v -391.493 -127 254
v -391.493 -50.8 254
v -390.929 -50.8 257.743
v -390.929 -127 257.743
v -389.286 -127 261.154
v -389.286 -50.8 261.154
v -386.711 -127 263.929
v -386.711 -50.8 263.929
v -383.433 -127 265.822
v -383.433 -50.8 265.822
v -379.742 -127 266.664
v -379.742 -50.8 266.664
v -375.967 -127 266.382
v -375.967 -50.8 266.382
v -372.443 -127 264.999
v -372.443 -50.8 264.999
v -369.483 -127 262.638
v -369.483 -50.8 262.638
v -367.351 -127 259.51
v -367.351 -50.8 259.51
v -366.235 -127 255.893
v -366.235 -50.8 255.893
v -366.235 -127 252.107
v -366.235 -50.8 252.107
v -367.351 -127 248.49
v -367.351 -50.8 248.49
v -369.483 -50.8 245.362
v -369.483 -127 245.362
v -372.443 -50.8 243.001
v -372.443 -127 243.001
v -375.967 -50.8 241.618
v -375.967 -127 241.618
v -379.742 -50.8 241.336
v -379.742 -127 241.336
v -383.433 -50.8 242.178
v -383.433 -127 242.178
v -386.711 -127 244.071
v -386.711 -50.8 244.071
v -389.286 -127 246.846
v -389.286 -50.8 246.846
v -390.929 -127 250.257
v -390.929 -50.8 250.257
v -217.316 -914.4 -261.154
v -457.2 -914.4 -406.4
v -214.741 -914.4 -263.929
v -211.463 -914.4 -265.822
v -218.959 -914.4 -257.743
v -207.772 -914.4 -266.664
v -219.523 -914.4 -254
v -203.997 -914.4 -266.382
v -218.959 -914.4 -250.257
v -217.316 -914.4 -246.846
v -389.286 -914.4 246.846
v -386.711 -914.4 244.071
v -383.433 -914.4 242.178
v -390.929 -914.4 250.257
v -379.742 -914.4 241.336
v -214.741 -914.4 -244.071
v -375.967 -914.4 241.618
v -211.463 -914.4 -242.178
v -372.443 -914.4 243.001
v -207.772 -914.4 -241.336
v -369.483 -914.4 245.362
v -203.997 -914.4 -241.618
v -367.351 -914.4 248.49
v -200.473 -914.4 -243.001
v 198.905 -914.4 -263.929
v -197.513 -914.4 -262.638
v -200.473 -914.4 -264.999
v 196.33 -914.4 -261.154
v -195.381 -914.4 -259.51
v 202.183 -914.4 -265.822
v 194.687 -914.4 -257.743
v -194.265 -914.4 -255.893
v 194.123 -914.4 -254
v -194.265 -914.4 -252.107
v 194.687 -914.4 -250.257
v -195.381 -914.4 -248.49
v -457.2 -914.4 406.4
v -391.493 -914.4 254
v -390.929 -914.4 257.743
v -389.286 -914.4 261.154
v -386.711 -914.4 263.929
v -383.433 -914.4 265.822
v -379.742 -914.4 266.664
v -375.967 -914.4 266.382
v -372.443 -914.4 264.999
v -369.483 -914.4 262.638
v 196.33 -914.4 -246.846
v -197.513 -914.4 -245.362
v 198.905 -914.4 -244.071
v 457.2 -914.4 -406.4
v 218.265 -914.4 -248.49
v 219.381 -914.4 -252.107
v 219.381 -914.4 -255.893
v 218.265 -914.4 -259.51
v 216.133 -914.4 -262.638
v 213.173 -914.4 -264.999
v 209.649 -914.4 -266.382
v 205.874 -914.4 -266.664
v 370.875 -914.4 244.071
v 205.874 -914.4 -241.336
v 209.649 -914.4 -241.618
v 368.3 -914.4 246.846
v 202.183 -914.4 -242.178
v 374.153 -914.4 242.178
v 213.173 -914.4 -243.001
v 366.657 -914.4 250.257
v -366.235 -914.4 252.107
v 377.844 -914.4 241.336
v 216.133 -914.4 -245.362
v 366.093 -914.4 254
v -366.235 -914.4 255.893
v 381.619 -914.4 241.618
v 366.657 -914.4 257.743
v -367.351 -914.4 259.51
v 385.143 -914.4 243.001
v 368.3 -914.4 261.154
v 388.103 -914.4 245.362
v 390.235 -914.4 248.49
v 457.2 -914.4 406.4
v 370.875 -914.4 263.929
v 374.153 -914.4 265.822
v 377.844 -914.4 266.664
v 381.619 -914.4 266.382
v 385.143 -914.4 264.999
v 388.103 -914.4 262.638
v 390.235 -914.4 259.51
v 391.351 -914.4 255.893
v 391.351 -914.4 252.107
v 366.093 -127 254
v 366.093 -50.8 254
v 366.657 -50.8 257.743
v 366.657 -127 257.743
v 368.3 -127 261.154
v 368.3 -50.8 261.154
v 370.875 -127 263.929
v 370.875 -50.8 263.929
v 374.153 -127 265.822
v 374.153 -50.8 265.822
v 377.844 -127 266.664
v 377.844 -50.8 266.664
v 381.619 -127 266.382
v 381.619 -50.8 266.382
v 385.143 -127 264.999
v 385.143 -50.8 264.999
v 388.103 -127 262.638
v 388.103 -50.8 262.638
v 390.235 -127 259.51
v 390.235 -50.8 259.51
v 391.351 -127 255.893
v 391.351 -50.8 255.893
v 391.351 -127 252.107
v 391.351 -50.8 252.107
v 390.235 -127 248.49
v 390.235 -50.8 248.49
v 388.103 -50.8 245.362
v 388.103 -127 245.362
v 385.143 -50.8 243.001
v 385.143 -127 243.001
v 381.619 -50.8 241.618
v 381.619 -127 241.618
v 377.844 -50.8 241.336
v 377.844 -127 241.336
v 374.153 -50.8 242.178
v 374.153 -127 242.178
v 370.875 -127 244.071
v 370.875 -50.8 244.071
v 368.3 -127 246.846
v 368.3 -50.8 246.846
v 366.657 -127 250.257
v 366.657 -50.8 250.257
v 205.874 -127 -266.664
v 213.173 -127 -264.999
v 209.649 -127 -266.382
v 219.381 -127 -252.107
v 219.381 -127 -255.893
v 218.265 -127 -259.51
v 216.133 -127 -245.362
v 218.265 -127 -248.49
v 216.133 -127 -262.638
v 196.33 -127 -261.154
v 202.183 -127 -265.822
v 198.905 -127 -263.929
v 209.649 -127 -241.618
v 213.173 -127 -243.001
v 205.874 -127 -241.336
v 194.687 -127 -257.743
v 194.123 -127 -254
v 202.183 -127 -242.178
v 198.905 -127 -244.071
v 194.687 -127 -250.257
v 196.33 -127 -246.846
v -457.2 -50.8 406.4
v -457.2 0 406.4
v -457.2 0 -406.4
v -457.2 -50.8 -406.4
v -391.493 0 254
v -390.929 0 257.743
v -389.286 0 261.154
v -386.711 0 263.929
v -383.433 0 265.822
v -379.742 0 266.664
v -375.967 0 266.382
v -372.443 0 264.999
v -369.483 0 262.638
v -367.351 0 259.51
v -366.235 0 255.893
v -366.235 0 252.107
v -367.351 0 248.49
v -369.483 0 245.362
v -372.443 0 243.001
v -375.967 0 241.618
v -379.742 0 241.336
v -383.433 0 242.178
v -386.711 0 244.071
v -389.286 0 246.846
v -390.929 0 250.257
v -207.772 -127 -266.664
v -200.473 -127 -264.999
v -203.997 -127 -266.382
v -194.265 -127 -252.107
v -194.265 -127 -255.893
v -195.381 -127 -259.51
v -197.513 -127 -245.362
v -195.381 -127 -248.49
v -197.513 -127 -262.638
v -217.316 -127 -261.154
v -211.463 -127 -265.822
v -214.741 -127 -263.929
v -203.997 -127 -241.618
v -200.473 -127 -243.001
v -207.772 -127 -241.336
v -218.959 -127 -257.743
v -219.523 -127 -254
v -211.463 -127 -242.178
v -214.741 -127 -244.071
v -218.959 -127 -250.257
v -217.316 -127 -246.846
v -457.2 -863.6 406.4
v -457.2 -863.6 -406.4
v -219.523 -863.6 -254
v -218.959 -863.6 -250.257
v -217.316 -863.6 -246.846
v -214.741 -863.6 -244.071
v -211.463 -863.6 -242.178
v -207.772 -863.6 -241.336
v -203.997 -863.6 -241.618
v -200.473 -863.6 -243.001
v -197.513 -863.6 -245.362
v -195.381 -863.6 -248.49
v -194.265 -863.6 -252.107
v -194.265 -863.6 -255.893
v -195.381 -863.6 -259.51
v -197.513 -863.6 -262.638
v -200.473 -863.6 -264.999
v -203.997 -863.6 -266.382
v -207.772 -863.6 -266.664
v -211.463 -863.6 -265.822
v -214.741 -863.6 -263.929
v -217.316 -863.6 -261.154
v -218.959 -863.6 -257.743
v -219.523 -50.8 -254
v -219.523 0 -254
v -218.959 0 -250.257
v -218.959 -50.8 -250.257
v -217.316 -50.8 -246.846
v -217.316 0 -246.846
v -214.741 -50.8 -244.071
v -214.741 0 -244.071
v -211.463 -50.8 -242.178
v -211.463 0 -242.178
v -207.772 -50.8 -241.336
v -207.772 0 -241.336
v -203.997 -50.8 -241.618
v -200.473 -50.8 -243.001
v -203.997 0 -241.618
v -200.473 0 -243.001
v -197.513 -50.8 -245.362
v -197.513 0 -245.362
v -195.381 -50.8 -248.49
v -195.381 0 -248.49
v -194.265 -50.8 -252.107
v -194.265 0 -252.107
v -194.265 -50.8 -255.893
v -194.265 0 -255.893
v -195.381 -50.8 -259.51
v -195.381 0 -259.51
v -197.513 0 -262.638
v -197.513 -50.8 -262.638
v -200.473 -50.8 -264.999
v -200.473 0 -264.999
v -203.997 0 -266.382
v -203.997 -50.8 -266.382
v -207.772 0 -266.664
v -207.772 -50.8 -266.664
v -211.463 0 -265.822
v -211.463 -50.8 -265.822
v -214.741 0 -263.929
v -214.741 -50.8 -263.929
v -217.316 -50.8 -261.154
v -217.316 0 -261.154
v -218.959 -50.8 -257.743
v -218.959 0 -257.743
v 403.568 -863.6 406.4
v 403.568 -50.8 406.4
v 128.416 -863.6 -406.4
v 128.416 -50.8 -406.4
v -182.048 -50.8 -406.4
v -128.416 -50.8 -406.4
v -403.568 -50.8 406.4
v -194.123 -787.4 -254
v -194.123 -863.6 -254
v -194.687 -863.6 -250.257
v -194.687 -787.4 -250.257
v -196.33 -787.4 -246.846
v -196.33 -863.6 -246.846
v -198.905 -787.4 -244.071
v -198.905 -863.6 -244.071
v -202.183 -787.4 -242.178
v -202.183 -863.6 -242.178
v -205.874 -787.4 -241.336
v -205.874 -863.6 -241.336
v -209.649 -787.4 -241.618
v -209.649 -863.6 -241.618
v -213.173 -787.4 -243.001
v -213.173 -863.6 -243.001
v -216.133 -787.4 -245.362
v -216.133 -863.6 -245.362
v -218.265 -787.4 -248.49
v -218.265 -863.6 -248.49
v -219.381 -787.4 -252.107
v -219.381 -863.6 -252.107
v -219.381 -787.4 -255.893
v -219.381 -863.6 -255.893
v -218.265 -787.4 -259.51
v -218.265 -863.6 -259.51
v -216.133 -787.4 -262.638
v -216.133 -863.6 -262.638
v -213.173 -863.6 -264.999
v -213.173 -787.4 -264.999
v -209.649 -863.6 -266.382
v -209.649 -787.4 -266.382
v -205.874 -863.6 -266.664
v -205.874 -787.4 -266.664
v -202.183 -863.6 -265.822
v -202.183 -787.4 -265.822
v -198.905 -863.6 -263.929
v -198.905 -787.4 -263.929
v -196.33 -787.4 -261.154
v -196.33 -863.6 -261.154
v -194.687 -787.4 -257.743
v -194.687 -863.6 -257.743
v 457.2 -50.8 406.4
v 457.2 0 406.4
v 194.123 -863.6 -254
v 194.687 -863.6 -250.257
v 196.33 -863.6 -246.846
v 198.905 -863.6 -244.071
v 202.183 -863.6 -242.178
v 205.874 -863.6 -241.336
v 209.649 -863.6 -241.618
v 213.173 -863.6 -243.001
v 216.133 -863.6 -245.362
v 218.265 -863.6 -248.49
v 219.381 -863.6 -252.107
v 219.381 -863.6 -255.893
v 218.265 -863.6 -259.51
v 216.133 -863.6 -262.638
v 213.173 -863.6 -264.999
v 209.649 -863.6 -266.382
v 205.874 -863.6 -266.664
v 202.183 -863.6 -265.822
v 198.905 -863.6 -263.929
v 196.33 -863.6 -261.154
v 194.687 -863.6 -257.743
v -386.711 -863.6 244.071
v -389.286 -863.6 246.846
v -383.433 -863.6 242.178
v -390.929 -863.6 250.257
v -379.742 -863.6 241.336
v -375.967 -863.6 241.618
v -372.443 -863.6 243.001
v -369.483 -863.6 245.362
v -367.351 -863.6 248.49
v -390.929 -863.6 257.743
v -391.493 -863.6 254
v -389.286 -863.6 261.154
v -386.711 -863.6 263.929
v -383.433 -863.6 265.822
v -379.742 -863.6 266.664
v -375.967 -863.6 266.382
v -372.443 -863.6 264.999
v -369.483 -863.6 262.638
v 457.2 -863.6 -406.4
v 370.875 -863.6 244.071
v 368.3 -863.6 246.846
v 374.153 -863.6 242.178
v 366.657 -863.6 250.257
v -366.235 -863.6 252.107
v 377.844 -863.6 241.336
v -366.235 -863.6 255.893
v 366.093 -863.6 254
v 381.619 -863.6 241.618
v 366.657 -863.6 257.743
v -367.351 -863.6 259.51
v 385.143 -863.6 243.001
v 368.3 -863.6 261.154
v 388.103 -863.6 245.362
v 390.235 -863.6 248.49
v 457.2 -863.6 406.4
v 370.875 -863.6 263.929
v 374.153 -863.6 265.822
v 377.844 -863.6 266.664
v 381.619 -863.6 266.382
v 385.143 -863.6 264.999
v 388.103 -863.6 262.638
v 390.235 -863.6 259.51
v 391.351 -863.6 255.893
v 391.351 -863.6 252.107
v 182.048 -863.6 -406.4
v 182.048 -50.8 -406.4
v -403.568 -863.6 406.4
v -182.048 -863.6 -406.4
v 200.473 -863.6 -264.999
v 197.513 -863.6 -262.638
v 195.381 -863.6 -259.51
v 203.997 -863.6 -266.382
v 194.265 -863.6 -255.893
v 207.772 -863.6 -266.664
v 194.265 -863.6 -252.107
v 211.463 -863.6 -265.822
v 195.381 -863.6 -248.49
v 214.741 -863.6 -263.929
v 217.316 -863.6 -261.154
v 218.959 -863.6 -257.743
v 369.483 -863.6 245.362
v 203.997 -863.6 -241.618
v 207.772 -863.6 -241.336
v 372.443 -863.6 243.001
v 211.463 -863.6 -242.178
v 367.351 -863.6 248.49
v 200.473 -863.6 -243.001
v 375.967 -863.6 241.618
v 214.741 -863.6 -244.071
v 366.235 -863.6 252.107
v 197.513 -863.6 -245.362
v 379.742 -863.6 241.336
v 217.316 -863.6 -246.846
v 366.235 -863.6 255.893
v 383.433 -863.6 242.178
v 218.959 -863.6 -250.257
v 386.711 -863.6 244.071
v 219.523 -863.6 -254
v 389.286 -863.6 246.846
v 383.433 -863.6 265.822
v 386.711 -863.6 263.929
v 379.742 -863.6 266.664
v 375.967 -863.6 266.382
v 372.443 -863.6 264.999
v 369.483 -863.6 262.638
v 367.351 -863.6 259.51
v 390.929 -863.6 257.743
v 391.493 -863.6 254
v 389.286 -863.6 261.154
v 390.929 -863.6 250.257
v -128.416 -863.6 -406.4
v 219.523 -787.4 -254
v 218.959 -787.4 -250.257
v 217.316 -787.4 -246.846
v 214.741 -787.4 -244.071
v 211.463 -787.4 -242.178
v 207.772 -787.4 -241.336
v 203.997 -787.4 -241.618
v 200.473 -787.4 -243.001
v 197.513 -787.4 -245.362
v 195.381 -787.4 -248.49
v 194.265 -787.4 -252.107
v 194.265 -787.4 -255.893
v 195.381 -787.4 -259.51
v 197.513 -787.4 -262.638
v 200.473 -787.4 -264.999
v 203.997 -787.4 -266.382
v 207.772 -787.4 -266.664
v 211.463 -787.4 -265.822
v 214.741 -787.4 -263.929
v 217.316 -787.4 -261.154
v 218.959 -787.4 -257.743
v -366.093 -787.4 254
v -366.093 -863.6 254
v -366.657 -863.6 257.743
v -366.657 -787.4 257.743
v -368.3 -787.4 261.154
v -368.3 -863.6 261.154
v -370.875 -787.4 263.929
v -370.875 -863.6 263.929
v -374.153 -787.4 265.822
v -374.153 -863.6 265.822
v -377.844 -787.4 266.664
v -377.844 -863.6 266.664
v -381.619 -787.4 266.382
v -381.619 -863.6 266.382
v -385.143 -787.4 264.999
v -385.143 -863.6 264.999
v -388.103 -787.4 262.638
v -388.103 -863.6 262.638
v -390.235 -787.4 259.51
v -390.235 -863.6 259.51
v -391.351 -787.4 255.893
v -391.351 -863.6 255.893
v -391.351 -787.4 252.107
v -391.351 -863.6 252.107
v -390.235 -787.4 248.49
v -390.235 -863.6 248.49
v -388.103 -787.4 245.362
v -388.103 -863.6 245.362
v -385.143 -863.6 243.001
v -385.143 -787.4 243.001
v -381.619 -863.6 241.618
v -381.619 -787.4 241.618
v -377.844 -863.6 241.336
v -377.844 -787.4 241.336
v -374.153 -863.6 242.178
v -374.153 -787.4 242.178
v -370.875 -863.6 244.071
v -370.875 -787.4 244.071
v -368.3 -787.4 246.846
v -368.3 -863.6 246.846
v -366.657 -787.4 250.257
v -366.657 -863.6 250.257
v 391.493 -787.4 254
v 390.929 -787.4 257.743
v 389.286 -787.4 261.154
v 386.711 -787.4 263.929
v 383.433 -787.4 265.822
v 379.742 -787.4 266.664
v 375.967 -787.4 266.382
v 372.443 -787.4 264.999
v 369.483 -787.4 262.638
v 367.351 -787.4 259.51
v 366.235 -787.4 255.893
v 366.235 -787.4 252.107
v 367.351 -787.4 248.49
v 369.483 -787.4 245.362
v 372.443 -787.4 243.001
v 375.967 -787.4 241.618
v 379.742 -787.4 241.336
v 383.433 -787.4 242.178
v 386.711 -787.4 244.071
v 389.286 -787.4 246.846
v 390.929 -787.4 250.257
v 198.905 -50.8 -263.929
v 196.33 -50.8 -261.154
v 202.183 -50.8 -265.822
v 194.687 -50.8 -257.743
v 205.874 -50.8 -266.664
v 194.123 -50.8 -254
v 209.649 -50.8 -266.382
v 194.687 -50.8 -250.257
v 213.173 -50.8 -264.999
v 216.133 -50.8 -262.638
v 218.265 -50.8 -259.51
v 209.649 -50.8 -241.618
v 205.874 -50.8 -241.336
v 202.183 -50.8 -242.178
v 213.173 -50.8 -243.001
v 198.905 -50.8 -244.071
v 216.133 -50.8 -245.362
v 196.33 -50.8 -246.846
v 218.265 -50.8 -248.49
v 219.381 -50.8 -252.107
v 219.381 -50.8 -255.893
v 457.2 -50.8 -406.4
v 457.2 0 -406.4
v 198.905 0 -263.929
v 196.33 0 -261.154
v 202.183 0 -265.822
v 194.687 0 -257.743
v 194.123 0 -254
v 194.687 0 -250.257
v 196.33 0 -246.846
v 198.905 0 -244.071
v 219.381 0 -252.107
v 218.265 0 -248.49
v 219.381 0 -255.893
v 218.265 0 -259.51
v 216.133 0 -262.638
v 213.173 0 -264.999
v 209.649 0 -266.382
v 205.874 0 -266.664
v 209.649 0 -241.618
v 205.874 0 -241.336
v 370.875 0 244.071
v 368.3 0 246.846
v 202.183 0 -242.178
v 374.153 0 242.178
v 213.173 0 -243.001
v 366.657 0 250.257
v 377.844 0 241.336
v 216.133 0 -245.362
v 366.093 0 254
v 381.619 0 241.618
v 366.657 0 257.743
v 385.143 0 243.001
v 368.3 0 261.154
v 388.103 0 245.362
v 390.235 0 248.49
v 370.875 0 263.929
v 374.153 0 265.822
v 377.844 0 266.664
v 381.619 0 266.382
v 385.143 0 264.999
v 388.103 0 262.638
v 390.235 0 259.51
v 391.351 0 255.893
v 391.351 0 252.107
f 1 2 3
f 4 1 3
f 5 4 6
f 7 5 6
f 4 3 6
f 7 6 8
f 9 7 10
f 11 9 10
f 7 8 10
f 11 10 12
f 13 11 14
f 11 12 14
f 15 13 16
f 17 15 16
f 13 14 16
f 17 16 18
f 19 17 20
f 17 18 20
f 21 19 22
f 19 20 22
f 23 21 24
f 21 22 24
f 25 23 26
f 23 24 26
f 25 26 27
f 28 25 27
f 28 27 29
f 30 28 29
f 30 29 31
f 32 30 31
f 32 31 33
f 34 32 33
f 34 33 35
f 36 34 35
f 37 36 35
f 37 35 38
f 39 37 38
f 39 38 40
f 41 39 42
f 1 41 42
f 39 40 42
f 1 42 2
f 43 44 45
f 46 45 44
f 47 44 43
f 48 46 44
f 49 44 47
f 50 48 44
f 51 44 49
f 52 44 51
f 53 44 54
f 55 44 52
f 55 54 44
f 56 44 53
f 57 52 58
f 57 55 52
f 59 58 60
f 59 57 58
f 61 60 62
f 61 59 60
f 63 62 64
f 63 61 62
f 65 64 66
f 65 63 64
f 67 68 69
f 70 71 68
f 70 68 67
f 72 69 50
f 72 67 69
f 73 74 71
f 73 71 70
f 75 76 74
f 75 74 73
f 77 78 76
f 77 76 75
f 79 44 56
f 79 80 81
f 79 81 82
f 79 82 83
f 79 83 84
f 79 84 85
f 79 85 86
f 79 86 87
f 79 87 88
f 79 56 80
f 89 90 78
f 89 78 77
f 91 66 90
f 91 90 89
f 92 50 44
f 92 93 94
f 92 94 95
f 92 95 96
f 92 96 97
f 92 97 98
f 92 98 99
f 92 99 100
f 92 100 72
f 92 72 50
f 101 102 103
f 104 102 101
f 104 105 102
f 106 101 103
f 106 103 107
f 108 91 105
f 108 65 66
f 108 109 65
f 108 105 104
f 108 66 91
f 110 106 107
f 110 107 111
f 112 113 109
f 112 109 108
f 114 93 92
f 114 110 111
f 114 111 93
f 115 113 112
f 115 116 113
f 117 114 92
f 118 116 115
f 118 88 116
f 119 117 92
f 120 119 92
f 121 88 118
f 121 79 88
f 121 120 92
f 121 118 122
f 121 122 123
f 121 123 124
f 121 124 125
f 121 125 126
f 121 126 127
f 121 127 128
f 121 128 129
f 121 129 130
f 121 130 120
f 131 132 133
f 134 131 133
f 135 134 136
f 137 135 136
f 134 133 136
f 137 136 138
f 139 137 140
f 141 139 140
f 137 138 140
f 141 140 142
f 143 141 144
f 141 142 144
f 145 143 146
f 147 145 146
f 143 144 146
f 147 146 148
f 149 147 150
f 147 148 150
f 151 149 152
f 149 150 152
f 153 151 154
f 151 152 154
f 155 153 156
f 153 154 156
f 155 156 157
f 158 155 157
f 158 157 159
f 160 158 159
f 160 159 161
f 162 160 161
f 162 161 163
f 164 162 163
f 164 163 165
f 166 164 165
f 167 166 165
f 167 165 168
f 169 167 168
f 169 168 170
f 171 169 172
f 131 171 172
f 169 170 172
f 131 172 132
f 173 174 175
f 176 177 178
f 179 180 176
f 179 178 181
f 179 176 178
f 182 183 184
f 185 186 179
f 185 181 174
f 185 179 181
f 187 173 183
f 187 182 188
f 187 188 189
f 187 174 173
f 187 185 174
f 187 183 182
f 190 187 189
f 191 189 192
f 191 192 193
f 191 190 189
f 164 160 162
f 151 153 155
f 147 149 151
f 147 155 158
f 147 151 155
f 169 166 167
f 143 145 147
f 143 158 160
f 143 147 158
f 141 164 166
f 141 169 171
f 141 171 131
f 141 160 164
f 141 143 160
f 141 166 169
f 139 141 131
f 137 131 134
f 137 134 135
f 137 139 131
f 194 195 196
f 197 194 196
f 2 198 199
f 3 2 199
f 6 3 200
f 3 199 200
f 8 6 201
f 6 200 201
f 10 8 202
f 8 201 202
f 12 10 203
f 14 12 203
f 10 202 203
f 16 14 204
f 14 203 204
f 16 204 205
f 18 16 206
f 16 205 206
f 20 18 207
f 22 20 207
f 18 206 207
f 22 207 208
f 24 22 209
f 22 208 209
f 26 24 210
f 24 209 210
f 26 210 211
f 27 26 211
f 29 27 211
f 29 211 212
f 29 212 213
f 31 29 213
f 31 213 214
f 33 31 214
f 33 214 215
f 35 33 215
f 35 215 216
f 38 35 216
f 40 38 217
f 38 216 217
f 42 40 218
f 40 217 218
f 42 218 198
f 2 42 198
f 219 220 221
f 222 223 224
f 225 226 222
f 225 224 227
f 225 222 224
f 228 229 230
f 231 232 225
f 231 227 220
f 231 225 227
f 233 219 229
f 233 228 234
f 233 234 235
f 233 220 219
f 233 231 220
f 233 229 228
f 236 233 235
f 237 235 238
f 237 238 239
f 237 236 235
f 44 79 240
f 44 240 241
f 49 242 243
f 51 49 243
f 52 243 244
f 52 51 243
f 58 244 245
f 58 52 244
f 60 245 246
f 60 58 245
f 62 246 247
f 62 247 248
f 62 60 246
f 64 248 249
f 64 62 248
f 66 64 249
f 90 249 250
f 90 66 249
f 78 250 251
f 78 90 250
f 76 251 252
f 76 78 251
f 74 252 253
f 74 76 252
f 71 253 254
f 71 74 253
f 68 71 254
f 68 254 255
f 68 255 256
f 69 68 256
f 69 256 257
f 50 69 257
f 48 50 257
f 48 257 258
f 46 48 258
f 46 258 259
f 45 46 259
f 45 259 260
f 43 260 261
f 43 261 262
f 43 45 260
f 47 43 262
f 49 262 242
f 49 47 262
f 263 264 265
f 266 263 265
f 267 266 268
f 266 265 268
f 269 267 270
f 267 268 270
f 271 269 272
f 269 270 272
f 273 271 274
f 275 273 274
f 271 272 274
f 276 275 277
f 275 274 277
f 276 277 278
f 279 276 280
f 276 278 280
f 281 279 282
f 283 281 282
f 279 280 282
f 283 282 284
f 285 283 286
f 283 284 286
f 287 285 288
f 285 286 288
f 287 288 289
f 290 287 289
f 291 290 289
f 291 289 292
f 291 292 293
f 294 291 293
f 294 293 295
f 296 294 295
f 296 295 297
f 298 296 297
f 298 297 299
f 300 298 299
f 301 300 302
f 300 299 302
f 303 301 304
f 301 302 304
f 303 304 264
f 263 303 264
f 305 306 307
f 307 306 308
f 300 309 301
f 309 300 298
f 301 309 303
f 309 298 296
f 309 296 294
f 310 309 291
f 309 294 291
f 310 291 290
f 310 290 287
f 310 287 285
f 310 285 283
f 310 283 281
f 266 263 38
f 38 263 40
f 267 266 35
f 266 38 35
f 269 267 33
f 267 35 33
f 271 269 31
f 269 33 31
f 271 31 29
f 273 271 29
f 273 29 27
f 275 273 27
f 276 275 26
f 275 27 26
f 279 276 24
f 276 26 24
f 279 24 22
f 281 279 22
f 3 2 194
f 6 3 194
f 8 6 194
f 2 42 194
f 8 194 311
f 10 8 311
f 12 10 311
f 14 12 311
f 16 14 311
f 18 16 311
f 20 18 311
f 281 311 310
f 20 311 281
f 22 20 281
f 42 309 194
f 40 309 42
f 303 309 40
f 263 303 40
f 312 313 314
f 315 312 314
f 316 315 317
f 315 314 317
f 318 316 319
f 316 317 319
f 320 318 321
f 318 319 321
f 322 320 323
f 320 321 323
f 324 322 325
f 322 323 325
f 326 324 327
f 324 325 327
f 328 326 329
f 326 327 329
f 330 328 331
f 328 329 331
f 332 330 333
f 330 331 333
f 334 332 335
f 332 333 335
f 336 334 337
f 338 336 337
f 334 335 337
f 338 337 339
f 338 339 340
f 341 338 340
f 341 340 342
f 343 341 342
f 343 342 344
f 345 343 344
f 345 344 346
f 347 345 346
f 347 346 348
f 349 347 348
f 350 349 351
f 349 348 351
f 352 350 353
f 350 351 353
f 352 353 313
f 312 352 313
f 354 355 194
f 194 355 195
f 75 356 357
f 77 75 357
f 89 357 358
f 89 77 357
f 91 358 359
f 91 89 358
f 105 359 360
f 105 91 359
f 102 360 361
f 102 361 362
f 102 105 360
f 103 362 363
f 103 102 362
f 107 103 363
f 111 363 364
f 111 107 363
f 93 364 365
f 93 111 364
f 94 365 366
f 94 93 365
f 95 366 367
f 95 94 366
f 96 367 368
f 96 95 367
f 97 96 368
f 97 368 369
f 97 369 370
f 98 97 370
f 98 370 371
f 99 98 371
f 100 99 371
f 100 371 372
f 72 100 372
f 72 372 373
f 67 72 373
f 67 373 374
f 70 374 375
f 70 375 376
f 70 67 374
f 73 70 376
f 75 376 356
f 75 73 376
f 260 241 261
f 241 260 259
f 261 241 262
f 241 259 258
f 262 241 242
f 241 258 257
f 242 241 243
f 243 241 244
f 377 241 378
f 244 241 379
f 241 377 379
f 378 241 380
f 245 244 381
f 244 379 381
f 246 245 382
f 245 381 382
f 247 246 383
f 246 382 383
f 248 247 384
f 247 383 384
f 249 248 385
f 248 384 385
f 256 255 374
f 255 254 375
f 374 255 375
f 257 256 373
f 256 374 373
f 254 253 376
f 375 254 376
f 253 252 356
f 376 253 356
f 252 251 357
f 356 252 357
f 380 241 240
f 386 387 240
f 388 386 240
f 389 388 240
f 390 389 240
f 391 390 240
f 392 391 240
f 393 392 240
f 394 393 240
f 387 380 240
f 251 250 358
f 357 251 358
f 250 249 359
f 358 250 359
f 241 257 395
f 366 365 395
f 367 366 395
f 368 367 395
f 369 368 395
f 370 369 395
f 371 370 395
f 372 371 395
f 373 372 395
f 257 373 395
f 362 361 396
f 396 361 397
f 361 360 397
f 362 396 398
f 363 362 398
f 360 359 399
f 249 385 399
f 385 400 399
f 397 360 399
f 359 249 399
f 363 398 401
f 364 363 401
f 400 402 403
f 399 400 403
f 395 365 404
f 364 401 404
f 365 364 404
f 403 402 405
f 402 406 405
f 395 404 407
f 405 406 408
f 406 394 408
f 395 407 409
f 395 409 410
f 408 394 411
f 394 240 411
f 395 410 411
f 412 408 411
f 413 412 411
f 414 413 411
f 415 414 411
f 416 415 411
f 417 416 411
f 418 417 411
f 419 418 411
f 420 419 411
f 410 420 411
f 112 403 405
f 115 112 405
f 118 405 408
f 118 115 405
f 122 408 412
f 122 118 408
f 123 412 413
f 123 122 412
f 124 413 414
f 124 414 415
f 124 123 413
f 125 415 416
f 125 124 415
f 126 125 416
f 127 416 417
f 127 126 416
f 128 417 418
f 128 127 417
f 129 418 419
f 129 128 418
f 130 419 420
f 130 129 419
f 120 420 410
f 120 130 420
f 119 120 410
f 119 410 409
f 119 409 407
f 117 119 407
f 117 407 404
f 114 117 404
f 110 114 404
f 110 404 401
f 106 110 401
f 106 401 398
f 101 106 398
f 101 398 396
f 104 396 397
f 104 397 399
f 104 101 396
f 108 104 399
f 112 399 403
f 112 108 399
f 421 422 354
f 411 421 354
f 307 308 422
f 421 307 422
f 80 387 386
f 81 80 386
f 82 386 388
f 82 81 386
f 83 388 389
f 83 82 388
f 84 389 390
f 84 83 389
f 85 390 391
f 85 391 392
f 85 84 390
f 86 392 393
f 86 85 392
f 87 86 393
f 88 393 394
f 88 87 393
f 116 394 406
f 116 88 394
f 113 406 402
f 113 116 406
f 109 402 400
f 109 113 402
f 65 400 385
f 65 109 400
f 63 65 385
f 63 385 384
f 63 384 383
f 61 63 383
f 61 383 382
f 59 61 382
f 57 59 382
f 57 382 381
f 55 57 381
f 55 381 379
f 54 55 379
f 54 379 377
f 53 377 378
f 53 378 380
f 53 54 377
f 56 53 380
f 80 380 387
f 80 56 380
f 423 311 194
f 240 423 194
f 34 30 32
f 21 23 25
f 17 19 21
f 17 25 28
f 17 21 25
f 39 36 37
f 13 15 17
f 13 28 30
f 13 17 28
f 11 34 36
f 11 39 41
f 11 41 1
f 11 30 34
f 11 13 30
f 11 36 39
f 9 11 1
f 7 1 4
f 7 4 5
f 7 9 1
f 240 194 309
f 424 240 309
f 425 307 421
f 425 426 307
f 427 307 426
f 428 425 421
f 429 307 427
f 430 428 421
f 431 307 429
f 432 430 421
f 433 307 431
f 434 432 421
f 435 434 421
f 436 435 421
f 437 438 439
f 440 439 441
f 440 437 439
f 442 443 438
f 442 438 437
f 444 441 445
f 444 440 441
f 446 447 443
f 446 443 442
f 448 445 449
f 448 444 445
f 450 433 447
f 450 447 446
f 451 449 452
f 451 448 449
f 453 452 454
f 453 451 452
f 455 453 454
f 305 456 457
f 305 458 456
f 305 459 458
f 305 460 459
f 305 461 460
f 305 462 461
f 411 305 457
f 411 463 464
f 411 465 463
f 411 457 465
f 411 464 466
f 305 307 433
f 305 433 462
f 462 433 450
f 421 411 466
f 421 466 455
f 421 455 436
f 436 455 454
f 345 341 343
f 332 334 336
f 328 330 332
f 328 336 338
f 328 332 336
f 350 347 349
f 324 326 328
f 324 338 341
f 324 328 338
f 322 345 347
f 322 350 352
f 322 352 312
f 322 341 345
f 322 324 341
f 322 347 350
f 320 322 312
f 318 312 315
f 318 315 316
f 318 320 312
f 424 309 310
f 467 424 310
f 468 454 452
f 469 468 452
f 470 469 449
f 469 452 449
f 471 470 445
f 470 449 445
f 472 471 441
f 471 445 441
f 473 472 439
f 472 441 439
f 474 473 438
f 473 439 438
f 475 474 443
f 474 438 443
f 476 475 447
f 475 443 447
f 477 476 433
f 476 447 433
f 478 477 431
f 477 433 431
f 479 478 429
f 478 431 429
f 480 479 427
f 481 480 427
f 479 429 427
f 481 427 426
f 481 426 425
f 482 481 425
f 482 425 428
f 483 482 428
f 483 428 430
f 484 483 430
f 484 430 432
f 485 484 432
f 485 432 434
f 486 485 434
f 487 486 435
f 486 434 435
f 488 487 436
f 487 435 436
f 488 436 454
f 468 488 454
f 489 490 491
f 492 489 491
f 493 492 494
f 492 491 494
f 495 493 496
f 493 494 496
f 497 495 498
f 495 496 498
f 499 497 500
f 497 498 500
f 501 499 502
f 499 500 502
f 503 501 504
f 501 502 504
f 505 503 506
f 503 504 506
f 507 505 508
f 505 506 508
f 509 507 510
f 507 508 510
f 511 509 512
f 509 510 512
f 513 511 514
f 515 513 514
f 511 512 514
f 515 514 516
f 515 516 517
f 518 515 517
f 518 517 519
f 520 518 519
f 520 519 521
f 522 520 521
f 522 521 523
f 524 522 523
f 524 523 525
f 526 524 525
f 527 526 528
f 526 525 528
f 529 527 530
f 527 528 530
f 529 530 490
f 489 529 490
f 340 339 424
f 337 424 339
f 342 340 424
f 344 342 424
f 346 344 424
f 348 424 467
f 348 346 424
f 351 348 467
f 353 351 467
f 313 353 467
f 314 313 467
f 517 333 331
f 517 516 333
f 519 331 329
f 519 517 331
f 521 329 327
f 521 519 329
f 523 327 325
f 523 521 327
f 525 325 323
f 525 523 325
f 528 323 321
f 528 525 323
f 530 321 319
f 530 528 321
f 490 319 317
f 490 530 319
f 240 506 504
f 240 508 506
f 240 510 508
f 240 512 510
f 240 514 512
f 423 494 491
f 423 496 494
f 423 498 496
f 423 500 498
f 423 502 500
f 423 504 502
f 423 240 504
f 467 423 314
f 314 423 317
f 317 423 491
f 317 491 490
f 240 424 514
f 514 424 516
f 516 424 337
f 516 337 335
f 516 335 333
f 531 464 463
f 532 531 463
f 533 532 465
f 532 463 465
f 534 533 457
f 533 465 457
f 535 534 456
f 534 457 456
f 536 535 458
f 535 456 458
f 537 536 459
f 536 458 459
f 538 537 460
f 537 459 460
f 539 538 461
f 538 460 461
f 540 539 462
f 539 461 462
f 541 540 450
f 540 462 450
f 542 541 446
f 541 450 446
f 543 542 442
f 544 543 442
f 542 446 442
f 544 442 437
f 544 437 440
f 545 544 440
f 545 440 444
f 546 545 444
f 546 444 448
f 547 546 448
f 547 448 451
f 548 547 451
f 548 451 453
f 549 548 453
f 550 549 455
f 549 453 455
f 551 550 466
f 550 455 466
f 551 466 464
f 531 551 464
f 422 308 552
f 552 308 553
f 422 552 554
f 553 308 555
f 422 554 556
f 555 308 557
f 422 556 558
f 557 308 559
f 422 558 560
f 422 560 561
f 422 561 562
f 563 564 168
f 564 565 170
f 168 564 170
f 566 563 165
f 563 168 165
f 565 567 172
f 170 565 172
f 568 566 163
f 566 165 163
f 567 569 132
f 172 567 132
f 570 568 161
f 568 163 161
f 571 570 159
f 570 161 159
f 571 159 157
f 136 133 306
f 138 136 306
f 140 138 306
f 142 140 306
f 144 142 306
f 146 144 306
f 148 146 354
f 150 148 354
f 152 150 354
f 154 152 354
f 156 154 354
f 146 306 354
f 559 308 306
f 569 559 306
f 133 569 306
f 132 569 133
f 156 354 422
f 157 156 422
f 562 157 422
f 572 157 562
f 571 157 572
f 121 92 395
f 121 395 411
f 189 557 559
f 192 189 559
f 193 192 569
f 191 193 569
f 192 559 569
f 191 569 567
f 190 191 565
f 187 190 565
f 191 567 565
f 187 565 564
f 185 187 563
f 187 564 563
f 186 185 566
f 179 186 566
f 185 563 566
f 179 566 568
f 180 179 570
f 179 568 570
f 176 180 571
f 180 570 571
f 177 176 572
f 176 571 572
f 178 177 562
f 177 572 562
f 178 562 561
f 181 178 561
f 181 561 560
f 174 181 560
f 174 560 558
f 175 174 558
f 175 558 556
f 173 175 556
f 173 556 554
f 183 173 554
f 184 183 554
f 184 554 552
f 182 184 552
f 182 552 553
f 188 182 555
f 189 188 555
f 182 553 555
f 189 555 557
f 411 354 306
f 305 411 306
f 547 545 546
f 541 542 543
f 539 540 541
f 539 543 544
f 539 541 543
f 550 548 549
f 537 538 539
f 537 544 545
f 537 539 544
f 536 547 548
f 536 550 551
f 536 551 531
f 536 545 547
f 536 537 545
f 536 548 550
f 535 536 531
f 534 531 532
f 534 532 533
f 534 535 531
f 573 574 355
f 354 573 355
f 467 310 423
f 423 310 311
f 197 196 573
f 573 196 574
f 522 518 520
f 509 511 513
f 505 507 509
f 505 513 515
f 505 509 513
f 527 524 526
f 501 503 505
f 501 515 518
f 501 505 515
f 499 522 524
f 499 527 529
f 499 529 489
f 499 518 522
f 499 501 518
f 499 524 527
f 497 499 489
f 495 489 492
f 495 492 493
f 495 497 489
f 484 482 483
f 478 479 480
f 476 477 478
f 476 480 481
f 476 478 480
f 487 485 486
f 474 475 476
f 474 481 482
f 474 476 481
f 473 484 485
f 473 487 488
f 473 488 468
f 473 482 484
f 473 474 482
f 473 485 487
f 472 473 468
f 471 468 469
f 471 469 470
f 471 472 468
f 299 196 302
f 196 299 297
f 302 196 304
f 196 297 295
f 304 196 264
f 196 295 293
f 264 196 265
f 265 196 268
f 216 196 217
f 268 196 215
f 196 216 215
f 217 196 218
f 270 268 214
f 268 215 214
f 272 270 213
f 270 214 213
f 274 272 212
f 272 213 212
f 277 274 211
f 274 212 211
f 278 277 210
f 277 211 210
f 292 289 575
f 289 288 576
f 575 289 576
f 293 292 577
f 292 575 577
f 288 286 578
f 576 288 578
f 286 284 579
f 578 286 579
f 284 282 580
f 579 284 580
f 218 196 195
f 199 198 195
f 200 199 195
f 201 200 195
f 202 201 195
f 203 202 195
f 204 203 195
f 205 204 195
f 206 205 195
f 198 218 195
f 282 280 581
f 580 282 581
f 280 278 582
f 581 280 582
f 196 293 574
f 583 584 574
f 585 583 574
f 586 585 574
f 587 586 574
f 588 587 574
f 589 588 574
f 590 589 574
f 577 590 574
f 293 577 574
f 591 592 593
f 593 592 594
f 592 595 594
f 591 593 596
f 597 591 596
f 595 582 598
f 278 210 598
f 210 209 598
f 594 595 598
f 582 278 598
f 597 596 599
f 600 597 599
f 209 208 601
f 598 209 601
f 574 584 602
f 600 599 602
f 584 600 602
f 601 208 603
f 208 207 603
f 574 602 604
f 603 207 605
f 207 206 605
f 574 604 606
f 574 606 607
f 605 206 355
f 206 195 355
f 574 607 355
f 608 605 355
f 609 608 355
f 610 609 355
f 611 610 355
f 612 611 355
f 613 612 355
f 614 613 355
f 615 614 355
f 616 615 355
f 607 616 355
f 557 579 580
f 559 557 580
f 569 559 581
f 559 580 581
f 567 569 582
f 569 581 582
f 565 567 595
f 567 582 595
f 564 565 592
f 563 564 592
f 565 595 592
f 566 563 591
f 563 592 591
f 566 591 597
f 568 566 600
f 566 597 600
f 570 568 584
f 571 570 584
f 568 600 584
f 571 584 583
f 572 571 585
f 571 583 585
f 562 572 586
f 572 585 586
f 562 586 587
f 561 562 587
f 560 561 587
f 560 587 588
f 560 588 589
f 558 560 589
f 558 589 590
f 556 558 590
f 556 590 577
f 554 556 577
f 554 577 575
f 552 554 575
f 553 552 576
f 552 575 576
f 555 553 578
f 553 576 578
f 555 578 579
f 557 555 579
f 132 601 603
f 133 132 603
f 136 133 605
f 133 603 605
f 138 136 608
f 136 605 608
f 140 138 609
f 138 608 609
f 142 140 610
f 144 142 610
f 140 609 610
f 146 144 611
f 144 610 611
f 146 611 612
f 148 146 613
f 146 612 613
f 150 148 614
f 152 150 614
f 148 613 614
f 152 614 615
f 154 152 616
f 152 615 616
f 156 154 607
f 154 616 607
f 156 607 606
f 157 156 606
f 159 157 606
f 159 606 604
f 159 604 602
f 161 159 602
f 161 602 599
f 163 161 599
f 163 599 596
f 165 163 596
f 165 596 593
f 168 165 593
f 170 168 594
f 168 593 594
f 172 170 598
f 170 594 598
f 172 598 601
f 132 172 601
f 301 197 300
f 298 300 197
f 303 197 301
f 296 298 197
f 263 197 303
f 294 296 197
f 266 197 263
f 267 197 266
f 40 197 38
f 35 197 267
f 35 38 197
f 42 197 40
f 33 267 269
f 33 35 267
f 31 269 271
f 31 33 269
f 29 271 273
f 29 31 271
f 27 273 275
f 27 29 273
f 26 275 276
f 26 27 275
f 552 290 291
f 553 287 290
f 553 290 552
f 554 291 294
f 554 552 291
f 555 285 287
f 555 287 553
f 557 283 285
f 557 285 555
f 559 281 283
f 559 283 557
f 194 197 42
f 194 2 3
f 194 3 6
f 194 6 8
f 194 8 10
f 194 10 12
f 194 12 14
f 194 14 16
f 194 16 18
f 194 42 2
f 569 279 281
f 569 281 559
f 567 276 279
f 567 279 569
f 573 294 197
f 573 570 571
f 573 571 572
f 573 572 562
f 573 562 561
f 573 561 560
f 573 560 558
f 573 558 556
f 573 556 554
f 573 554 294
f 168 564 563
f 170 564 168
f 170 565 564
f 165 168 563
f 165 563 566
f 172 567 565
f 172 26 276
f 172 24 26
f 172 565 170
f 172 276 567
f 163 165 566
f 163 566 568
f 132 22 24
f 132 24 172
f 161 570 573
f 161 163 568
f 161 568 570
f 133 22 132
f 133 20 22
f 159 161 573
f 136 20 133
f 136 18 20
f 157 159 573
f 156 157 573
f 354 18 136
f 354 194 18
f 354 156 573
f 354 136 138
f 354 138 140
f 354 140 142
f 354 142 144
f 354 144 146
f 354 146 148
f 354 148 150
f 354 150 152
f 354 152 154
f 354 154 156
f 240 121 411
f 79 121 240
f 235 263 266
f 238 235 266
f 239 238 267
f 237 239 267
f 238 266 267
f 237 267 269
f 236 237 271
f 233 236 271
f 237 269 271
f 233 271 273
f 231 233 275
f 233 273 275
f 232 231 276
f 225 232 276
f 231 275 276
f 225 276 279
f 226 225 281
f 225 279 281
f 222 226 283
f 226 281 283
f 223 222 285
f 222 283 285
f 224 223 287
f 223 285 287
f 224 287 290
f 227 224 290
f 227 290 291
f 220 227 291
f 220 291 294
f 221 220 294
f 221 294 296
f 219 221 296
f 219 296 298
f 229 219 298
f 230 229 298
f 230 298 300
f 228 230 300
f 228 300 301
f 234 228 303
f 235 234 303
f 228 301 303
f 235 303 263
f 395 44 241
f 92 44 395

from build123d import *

# Parameters (mm, degrees)
F1_DEPTH  = 50.8
F4_R      = 12.7
F5_DEPTH  = 50.8
F7_DEPTH  = 812.8
F8_R      = 12.7
F10_DEPTH = 76.2
F9_R      = 12.7
F11_DEPTH = 76.2


with BuildPart() as f1:
    # F0 (on Front) → F1 (new body)
    with BuildSketch(Plane.XZ):
        Polygon((-457.2, 406.4), (-457.2, -406.4), (0, -406.4), (457.2, -406.4), (457.2, 406.4), (0, 406.4), align=None)
    extrude(amount=F1_DEPTH)

    # F4 (on face) → F5 (cut, through all)
    with BuildSketch(Plane(origin=(0, 0, 0), x_dir=(-1, 0, 0), z_dir=(0, 1, 0))):
        with Locations((-378.7930289355, 254)):
            Circle(F4_R)
        with Locations((-206.8229049263, -254)):
            Circle(F4_R)
        with Locations((378.7930289355, 254)):
            Circle(F4_R)
        with Locations((206.8229049263, -254)):
            Circle(F4_R)
    extrude(amount=-F5_DEPTH, mode=Mode.SUBTRACT)


with BuildPart() as f6_1:
    # F6: instance of F1
    add(f1.part.mirror(Plane.XZ.offset(457.2)))


with BuildPart() as f7:
    # F3 (on face) → F7 (new body, through all)
    with BuildSketch(Plane.XZ.offset(50.8)):
        Polygon((-128.4159338618, -406.4), (-403.5681322764, 406.4), (-457.2, 406.4), (-182.0478015853, -406.4), align=None)
    extrude(amount=F7_DEPTH)


with BuildPart() as f7b:
    # F3 (on face) → F7, piece 2 (new body, through all)
    with BuildSketch(Plane.XZ.offset(50.8)):
        Polygon((457.2, 406.4), (403.5681322764, 406.4), (128.4159338618, -406.4), (182.0478015853, -406.4), align=None)
    extrude(amount=F7_DEPTH)


with BuildPart() as f10_tool:
    # F8 (on face) → F10 (new body)
    with BuildSketch(Plane(origin=(0, -50.8, 0), x_dir=(-1, 0, 0), z_dir=(0, 1, 0))):
        with Locations((-378.7930289355, 254)):
            Circle(F8_R)
        with Locations((-206.8229049263, -254)):
            Circle(F8_R)
        with Locations((378.7930289355, 254)):
            Circle(F8_R)
        with Locations((206.8229049263, -254)):
            Circle(F8_R)
    extrude(amount=-F10_DEPTH)


with BuildPart() as f7_1:
    add(f7.part)

    # F10: cut by f10_tool
    add(f10_tool.part, mode=Mode.SUBTRACT)


with BuildPart() as f7b_1:
    add(f7b.part)

    # F10: cut by f10_tool
    add(f10_tool.part, mode=Mode.SUBTRACT)


with BuildPart() as f11_tool:
    # F9 (on face) → F11 (new body)
    with BuildSketch(Plane.XZ.offset(863.6)):
        with Locations((-378.7930289355, 254)):
            Circle(F9_R)
        with Locations((-206.8229049263, -254)):
            Circle(F9_R)
        with Locations((378.7930289355, 254)):
            Circle(F9_R)
        with Locations((206.8229049263, -254)):
            Circle(F9_R)
    extrude(amount=-F11_DEPTH)


with BuildPart() as f7_2:
    add(f7_1.part)

    # F11: cut by f11_tool
    add(f11_tool.part, mode=Mode.SUBTRACT)


with BuildPart() as f7b_2:
    add(f7b_1.part)

    # F11: cut by f11_tool
    add(f11_tool.part, mode=Mode.SUBTRACT)


solid = Compound([f1.part, f6_1.part, f7_2.part, f7b_2.part])
